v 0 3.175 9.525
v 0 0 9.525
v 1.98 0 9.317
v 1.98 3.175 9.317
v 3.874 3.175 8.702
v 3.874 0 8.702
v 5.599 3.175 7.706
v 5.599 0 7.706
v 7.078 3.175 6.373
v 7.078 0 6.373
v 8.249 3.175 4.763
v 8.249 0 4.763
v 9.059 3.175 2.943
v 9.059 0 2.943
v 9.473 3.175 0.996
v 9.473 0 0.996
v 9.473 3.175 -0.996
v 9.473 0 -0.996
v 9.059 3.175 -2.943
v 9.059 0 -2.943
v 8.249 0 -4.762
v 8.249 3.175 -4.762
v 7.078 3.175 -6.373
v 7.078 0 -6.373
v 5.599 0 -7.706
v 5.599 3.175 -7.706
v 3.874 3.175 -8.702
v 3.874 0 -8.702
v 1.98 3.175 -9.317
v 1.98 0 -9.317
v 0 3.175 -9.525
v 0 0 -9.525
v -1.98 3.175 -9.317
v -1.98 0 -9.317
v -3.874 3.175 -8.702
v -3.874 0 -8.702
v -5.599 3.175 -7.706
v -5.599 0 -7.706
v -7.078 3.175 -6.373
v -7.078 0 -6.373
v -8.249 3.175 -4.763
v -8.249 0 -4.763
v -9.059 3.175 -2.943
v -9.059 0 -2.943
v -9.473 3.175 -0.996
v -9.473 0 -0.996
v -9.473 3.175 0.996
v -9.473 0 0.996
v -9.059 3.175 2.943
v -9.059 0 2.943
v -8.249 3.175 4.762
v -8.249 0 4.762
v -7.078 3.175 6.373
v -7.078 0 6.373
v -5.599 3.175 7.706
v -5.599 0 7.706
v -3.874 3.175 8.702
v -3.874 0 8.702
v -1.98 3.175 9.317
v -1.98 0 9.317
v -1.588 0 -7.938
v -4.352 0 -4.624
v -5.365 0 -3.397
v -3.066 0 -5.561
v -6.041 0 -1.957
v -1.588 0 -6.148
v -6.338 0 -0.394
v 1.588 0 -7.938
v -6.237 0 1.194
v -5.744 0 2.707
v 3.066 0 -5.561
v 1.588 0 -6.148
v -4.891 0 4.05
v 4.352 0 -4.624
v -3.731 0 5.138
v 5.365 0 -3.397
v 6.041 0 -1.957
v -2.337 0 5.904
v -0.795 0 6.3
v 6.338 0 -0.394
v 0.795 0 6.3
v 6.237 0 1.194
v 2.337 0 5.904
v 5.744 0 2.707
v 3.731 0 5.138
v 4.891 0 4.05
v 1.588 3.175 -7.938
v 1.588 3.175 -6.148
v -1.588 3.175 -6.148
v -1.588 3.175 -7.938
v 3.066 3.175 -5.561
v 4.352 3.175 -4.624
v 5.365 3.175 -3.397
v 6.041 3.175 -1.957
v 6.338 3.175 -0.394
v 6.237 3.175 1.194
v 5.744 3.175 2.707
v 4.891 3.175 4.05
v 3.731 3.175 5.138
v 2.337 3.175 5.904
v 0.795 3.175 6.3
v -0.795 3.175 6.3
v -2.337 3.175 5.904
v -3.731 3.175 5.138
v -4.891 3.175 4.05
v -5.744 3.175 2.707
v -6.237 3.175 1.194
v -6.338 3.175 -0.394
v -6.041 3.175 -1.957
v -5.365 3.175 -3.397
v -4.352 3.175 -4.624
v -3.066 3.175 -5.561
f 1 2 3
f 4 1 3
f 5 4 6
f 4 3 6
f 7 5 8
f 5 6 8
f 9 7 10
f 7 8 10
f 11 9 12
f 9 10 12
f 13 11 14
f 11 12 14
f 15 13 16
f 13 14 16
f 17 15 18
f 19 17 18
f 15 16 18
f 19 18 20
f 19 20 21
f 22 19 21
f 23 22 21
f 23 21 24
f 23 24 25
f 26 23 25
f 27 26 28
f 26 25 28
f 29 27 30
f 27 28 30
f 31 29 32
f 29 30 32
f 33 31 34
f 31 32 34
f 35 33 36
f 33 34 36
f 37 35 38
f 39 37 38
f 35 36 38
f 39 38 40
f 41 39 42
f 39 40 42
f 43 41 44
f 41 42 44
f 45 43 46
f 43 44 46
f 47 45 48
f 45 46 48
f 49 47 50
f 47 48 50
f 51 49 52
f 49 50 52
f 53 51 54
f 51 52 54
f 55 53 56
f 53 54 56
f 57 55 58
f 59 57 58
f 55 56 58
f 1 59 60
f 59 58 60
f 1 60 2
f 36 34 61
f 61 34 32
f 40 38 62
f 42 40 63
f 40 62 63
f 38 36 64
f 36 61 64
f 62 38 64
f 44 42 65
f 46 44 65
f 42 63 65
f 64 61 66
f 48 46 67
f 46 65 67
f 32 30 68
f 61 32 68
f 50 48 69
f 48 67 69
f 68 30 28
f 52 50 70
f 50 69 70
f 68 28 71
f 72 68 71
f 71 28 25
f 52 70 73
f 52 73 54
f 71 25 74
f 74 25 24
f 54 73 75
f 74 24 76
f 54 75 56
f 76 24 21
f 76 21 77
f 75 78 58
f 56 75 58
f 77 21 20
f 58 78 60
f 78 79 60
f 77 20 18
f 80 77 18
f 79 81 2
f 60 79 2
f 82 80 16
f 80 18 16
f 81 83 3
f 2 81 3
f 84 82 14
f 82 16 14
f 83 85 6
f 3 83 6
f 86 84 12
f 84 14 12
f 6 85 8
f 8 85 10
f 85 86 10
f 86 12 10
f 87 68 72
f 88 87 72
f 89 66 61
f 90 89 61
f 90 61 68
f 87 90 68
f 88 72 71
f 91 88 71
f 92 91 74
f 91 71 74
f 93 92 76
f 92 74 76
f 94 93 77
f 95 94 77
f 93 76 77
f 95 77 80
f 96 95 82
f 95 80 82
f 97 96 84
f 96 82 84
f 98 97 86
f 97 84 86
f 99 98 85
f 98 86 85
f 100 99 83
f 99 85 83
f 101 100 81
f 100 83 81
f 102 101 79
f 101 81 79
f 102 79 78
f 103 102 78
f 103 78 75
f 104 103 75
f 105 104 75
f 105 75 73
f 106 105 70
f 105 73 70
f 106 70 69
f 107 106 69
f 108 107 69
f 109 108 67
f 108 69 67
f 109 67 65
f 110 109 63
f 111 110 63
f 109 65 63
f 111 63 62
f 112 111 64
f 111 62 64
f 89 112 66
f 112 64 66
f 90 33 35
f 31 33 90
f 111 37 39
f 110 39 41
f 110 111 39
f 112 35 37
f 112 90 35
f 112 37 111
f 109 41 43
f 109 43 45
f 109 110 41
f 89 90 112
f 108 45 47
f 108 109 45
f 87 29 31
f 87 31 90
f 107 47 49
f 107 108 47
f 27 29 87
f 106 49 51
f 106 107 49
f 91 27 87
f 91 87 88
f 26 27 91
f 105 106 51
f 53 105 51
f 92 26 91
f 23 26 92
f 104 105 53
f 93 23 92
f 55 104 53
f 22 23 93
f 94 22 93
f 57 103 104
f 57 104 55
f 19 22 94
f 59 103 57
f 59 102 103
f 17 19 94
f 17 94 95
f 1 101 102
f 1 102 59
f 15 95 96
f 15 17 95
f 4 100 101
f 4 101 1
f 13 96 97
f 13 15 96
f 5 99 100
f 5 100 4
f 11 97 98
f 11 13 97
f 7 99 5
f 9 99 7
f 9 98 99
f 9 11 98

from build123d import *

# Parameters (mm, degrees)
SKETCH1_R           = 9.525
BOSS_EXTRUDE1_DEPTH = 3.175


with BuildPart() as part:
    # Sketch1 → Boss-Extrude1 (new body)
    with BuildSketch(Plane(origin=(0, 0, 0), x_dir=(1, 0, 0), z_dir=(0, 1, 0))):
        with Locations(Location((0, 0, 0), (0, 0, 270))):
            Circle(SKETCH1_R)
        with BuildLine():
            Line((-1.5875, 6.148361062), (-1.5875, 7.9375))
            Line((-1.5875, 7.9375), (1.5875, 7.9375))
            Line((1.5875, 7.9375), (1.5875, 6.148361062))
            ThreePointArc((1.5875, 6.148361062), (0, -6.35), (-1.5875, 6.148361062))
        make_face(mode=Mode.SUBTRACT)
    extrude(amount=BOSS_EXTRUDE1_DEPTH)


solid = part.part
